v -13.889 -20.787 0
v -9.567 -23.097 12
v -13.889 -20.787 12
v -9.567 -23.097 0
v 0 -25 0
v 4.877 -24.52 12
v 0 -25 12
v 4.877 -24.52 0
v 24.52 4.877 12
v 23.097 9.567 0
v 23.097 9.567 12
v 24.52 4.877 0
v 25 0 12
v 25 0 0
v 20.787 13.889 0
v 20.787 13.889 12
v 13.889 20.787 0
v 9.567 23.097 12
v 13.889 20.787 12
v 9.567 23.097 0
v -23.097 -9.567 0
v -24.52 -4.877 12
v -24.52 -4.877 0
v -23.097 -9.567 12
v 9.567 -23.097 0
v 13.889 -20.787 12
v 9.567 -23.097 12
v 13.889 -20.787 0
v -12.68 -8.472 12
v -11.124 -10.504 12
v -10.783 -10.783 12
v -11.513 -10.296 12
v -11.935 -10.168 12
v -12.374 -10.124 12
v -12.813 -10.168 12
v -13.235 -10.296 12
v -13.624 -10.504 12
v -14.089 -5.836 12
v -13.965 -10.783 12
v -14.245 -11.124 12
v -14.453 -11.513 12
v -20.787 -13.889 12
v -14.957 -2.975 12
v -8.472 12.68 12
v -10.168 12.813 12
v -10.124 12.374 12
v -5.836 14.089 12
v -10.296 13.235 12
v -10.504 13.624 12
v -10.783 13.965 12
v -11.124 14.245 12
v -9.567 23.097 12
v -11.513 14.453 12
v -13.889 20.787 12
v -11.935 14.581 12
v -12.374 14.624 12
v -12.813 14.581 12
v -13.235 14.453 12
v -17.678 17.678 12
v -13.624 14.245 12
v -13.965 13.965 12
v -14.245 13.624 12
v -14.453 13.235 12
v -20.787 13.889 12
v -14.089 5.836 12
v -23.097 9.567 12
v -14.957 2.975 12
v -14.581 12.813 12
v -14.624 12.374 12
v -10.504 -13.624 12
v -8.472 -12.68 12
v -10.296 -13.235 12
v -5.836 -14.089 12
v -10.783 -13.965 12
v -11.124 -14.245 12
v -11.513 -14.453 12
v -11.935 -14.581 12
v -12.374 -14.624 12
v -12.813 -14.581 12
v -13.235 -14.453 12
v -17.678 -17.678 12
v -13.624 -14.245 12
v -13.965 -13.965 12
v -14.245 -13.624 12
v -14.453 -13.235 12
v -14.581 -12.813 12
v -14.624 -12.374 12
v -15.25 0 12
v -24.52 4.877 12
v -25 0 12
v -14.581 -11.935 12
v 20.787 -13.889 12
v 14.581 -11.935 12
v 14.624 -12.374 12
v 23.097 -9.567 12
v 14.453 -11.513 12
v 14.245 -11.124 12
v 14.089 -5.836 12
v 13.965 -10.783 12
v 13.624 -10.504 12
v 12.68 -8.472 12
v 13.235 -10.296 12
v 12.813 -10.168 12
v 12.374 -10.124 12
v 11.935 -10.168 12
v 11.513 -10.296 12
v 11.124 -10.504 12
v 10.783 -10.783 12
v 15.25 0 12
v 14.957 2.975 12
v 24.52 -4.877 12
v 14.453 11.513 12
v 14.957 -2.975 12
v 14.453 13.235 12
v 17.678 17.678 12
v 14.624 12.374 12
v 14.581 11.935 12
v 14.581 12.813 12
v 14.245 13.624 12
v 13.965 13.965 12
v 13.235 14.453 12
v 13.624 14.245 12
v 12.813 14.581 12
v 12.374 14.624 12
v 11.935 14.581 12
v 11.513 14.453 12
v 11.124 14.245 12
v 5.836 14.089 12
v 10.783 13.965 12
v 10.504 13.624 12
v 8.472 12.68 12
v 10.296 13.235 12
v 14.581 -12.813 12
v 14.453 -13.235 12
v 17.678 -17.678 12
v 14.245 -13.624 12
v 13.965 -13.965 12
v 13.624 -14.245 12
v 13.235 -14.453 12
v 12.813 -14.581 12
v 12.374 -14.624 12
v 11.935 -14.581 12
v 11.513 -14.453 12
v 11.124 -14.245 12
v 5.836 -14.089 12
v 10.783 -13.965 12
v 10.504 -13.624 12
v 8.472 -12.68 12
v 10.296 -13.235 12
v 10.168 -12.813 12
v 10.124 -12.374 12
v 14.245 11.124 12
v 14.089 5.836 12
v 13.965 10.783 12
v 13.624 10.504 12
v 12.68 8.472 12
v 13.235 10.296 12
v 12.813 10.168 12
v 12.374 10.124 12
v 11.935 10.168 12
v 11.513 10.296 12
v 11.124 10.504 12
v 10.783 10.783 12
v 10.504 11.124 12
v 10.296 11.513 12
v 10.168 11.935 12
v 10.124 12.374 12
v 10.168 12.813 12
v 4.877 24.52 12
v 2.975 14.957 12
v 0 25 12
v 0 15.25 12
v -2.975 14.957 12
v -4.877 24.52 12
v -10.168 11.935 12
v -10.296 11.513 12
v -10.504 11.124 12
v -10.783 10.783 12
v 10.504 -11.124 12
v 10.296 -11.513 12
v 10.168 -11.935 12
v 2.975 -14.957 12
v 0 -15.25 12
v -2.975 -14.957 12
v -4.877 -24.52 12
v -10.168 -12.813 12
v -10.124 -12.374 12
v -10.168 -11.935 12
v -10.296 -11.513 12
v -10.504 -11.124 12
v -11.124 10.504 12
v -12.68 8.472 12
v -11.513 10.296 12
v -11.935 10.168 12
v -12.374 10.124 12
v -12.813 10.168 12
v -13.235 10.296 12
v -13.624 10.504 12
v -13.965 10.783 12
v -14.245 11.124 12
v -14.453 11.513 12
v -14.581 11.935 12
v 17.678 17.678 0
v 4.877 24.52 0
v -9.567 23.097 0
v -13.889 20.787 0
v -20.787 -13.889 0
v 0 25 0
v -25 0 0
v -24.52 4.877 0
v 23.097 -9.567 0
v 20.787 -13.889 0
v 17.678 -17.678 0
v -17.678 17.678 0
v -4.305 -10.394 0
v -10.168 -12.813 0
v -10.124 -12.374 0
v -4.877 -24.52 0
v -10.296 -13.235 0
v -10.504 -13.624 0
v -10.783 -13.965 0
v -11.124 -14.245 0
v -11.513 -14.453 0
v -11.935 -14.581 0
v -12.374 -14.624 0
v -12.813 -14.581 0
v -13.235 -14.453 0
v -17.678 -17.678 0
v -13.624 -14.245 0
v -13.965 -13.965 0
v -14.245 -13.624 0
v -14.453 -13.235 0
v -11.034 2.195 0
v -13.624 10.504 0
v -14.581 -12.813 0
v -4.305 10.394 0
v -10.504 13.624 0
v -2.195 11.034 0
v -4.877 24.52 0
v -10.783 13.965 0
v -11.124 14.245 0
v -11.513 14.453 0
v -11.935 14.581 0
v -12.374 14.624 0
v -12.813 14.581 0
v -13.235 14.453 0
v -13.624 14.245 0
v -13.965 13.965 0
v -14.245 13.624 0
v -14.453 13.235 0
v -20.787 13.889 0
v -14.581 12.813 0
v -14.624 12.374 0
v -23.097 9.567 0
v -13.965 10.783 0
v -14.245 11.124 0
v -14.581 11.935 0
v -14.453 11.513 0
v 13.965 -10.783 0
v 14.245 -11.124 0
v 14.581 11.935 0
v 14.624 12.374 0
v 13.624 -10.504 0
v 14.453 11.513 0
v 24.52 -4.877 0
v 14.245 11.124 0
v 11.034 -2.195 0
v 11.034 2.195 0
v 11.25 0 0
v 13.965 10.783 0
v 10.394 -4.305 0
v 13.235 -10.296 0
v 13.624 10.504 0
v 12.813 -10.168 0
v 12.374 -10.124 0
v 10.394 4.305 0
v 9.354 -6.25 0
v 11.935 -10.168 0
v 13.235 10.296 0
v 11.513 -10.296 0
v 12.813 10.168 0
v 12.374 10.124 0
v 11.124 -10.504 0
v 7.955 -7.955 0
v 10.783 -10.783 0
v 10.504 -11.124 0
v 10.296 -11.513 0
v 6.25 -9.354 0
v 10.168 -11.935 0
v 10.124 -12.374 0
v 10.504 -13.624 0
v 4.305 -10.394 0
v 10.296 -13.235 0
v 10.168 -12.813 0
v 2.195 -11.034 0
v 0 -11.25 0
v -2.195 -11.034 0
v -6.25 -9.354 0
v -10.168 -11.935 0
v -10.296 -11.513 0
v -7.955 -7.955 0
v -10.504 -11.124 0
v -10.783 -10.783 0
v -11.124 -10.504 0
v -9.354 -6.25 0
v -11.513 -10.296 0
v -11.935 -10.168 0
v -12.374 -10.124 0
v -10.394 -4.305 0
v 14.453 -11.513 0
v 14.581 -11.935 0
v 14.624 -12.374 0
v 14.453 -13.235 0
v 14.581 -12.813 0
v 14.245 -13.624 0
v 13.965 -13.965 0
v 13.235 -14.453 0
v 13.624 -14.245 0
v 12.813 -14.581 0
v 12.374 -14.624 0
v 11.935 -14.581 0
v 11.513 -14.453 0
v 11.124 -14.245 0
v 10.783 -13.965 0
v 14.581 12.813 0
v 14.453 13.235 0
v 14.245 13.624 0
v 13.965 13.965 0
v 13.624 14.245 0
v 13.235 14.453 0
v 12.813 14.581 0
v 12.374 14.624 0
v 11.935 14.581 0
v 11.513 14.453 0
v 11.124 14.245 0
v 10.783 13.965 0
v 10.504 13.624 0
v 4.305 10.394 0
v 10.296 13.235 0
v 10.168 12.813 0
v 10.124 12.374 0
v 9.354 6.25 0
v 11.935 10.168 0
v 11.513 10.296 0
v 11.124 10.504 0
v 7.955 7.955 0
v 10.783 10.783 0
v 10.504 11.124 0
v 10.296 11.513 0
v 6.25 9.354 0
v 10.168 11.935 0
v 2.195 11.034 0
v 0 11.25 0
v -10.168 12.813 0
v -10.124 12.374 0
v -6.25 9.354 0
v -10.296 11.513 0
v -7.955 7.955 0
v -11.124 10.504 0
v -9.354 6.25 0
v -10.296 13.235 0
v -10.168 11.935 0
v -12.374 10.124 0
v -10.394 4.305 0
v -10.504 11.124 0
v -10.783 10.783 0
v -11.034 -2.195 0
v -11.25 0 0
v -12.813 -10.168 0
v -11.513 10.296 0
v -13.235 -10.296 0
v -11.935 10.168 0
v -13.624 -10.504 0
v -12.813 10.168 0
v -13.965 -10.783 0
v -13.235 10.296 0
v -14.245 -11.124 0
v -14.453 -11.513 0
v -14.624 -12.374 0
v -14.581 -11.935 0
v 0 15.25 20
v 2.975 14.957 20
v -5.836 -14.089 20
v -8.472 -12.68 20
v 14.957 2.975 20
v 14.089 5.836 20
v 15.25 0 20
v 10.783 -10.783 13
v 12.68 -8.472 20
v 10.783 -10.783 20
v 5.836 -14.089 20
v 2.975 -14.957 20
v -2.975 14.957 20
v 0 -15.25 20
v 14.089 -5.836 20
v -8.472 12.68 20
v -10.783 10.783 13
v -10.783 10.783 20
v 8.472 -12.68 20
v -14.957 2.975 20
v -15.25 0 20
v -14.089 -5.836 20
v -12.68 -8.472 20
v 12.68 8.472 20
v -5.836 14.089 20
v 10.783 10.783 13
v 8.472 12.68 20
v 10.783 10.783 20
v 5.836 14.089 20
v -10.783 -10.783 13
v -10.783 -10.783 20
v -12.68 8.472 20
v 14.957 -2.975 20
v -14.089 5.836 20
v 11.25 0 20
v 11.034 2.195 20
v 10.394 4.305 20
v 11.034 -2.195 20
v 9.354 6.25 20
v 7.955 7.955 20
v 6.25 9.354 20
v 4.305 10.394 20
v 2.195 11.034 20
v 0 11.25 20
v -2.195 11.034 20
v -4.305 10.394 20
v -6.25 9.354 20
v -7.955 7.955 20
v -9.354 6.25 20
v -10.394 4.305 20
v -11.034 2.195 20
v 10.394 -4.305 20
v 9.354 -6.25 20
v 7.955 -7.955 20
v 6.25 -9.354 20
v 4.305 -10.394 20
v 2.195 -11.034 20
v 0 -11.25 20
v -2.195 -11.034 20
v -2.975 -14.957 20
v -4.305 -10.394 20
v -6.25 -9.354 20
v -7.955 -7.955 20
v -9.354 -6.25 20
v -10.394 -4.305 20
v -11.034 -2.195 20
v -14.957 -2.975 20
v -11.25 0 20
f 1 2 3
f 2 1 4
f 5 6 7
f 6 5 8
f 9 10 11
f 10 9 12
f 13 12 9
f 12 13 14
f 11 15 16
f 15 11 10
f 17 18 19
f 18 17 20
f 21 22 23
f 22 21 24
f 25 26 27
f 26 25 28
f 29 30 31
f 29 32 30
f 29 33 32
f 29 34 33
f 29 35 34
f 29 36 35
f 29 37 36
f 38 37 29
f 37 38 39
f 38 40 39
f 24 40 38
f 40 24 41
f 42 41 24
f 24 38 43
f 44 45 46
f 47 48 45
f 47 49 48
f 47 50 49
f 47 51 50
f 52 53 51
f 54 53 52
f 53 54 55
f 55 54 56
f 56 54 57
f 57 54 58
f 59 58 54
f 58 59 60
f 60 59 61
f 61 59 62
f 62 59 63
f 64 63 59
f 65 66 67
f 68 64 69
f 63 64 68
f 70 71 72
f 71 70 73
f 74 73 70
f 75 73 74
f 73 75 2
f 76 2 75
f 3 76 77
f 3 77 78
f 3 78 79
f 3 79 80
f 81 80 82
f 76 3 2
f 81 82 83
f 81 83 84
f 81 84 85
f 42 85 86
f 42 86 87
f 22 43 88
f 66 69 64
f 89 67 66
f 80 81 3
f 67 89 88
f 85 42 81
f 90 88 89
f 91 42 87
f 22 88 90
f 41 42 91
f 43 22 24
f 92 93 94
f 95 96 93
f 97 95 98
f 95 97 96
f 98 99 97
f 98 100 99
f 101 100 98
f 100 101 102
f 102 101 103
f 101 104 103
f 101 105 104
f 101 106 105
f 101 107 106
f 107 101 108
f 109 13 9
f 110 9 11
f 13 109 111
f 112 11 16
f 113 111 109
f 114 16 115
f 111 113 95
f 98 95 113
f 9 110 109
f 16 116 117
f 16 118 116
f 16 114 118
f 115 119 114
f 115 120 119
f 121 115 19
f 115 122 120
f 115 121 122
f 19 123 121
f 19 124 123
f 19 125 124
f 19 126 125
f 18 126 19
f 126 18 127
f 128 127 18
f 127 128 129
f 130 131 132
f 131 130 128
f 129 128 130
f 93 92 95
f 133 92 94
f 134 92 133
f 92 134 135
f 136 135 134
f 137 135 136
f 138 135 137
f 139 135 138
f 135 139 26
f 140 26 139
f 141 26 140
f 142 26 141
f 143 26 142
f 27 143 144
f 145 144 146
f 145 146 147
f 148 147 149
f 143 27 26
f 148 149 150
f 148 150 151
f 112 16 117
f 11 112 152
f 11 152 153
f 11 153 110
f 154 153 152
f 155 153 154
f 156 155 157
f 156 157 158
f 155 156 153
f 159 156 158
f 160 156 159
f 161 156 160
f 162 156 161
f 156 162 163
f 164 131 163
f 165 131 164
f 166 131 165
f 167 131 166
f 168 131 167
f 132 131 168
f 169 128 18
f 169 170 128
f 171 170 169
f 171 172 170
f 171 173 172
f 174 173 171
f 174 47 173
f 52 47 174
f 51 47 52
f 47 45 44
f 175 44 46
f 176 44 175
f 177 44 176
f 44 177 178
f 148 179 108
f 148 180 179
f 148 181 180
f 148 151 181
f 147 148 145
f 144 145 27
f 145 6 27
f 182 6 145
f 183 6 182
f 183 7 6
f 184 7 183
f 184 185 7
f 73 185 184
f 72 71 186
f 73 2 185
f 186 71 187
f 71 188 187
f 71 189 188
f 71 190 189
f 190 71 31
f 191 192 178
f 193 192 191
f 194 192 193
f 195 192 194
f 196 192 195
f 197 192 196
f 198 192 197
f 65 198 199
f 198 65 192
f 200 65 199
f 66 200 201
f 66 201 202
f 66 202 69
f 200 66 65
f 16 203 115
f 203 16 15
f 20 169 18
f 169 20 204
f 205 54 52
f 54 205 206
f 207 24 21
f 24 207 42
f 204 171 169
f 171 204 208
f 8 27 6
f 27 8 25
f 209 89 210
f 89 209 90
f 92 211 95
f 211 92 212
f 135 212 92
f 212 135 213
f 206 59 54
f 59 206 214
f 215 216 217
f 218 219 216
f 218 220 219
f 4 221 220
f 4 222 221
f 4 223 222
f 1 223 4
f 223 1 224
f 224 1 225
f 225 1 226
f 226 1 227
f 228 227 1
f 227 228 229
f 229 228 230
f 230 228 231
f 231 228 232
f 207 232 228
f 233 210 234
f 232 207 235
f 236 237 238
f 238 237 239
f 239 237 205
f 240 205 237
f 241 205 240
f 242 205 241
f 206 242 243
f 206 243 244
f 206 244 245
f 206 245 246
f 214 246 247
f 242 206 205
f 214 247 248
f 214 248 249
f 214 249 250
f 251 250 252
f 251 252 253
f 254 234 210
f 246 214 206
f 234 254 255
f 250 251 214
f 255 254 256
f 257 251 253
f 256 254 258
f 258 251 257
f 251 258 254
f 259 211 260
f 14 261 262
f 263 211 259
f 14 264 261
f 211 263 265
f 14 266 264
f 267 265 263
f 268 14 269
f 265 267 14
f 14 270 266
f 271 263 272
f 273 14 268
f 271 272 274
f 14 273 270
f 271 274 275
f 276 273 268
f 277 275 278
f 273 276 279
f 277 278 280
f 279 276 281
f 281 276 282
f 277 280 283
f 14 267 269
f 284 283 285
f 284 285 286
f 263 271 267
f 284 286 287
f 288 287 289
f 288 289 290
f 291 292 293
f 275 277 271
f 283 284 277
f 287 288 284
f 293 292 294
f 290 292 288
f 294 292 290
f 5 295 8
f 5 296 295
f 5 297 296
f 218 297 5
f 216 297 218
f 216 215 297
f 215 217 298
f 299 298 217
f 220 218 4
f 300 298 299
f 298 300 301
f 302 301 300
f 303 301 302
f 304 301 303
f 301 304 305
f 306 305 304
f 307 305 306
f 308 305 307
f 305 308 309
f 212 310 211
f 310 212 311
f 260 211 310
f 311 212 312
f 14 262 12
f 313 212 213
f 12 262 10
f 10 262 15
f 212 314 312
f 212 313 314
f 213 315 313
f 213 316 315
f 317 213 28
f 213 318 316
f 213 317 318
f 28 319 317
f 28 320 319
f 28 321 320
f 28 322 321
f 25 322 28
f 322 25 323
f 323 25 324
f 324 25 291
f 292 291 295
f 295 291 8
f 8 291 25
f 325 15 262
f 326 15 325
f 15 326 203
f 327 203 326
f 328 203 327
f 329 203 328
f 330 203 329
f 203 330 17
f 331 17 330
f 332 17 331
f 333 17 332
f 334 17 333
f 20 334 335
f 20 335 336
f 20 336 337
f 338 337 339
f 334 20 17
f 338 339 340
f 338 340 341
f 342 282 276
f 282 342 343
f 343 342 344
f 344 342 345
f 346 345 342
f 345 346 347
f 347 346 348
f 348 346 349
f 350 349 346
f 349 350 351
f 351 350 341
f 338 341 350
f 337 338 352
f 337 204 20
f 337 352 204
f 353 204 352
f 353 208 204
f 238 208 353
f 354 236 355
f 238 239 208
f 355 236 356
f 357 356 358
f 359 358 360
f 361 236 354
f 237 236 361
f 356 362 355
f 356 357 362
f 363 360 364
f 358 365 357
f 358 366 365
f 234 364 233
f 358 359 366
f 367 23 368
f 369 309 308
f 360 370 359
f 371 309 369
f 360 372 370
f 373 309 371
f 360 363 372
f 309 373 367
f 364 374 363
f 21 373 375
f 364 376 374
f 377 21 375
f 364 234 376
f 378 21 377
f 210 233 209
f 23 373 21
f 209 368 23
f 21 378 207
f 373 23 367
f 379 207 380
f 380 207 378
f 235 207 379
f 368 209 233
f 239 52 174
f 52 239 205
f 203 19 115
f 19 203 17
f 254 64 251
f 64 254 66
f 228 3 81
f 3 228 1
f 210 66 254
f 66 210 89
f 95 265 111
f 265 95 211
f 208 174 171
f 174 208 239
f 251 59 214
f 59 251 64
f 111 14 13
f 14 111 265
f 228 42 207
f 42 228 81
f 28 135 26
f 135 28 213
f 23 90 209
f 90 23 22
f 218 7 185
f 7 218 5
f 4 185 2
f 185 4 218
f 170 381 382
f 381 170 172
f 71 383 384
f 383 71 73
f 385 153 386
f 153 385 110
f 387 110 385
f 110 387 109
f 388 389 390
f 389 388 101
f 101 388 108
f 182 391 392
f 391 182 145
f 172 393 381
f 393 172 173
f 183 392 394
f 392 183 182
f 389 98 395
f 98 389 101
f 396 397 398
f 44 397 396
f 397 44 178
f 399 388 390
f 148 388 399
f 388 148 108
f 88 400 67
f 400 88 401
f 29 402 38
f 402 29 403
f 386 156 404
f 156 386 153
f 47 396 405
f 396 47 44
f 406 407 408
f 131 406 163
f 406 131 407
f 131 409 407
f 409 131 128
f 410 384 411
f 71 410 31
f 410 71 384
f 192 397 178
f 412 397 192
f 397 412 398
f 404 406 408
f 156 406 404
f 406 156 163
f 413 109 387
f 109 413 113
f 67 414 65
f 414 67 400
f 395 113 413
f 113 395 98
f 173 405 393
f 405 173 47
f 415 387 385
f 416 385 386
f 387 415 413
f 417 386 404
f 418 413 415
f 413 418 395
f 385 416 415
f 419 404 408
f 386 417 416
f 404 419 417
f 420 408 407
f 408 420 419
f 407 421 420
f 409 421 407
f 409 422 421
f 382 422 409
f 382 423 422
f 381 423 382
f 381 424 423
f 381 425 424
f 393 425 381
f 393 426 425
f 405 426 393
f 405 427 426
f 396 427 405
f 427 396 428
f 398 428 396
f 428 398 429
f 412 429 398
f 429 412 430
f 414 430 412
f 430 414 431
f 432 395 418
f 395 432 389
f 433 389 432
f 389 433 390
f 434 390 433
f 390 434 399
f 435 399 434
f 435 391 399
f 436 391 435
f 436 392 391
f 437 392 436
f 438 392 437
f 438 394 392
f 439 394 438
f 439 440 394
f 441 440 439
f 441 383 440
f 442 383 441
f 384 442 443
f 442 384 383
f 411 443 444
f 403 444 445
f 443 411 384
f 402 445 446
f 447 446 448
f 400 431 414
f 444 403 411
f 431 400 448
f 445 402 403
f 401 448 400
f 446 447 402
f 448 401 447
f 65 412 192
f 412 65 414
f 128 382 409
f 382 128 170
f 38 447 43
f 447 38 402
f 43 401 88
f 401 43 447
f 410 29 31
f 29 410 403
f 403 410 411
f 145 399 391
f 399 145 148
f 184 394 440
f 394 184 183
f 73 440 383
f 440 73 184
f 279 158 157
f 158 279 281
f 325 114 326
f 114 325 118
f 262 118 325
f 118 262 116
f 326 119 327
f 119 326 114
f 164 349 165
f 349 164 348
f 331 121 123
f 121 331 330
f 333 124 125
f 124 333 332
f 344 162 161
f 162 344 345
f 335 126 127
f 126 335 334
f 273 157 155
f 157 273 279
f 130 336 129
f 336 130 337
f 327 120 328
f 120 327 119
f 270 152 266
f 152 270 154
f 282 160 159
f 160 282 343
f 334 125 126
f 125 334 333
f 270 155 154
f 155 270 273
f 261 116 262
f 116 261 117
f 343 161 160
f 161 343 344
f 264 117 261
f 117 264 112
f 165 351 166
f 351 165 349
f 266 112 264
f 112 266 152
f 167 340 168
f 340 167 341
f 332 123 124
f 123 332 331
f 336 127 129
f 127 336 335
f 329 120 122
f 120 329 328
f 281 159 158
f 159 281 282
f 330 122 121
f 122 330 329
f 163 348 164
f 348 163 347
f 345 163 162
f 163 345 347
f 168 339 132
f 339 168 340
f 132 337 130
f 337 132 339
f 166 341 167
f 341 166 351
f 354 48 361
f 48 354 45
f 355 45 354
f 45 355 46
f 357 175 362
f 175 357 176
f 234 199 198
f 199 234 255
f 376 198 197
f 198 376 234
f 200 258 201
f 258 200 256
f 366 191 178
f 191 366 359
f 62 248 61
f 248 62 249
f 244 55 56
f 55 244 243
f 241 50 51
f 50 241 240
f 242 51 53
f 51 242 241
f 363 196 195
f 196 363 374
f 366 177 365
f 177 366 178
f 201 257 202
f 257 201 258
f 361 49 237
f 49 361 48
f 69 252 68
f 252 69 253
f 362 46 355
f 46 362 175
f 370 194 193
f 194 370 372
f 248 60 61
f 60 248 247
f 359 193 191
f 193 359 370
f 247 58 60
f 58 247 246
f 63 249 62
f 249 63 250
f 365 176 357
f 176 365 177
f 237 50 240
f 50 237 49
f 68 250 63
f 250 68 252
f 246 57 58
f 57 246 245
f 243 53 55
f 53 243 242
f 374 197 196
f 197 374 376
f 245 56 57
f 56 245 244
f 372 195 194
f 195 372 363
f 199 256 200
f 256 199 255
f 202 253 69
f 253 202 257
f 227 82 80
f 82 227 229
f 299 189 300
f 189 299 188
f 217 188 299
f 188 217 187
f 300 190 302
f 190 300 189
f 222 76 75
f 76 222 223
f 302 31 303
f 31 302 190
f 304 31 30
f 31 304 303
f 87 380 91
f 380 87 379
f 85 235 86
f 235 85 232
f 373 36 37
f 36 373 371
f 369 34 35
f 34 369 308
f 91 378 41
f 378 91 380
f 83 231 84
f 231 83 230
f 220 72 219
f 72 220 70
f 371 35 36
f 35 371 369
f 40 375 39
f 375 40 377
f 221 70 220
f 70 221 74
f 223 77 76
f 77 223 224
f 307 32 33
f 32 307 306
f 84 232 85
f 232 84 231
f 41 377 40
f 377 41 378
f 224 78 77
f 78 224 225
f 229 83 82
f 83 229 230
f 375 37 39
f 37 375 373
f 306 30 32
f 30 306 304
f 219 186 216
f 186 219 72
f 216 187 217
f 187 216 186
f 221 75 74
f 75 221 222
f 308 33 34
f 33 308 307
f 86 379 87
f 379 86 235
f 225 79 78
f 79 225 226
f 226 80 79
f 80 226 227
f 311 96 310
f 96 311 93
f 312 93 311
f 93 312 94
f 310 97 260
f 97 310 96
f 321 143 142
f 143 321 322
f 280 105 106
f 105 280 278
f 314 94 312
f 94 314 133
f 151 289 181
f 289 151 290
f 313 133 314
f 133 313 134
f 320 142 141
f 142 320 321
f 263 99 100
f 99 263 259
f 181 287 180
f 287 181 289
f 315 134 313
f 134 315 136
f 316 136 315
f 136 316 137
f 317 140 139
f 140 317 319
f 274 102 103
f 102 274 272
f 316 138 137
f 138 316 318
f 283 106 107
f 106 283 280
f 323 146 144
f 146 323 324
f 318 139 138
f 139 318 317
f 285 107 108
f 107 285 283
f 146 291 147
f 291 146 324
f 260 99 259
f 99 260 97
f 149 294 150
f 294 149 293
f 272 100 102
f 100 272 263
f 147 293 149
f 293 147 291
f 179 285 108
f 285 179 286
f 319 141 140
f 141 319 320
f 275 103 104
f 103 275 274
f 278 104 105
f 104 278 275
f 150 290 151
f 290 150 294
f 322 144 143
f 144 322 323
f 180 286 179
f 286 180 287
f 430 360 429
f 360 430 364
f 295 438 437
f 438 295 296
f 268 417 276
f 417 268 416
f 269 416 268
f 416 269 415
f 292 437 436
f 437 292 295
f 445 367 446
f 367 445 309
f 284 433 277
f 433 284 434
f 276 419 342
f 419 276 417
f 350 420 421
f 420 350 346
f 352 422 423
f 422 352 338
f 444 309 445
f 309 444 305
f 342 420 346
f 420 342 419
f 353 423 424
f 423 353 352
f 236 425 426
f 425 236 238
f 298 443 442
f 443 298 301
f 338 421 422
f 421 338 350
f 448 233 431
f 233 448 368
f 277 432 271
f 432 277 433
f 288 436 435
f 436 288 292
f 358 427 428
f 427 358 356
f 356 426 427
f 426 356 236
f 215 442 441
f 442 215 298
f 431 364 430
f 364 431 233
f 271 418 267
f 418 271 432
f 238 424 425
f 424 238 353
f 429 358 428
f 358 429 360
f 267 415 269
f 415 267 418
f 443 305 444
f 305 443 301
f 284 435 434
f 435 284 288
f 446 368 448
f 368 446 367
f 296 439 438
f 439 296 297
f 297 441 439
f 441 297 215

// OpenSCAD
$fn = 32;

// ----------------------------------------------------------------------
// Flange Ø50 x 12
// 4 holes on a Ø35 bolt circle, bolted joints
// ----------------------------------------------------------------------

// --- parameters (mm) ---
flange_d = 50;   // outside diameter of the flange
thickness = 12;  // flange thickness
holes = 4;       // number of bolt holes
pcd = 35;        // bolt circle diameter
start_deg = 45;  // angle of the first hole, from +X
hole_d = 4.5;    // bolt hole diameter
bore_d = 22.5;   // central through bore
hub_d = 30.5;    // hub outside diameter
hub_h = 8;       // hub height above the flange face (0 = no hub)

// --- derived feature positions (mm) ---
height = thickness + hub_h;  // = 20   overall height of the part
pcd_r = pcd / 2;             // = 17.5   bolt circle radius
hole_step = 360 / holes;     // = 90   angular pitch
feature_centers = [
  [pcd_r * cos(start_deg + 0 * hole_step), pcd_r * sin(start_deg + 0 * hole_step)],
  [pcd_r * cos(start_deg + 1 * hole_step), pcd_r * sin(start_deg + 1 * hole_step)],
  [pcd_r * cos(start_deg + 2 * hole_step), pcd_r * sin(start_deg + 2 * hole_step)],
  [pcd_r * cos(start_deg + 3 * hole_step), pcd_r * sin(start_deg + 3 * hole_step)]
];   // bolt hole centres on the pitch circle

// flange disc, every hole and the bore cut straight through
difference() {
  union() {
    cylinder(d = flange_d, h = thickness);
    cylinder(d = hub_d, h = height);  // hub, overlapped into the flange
  }
  translate([0, 0, -1]) cylinder(d = bore_d, h = height + 2);  // bore, through
  for (centre = feature_centers)
    translate([centre[0], centre[1], -1]) cylinder(d = hole_d, h = thickness + 2);
}
